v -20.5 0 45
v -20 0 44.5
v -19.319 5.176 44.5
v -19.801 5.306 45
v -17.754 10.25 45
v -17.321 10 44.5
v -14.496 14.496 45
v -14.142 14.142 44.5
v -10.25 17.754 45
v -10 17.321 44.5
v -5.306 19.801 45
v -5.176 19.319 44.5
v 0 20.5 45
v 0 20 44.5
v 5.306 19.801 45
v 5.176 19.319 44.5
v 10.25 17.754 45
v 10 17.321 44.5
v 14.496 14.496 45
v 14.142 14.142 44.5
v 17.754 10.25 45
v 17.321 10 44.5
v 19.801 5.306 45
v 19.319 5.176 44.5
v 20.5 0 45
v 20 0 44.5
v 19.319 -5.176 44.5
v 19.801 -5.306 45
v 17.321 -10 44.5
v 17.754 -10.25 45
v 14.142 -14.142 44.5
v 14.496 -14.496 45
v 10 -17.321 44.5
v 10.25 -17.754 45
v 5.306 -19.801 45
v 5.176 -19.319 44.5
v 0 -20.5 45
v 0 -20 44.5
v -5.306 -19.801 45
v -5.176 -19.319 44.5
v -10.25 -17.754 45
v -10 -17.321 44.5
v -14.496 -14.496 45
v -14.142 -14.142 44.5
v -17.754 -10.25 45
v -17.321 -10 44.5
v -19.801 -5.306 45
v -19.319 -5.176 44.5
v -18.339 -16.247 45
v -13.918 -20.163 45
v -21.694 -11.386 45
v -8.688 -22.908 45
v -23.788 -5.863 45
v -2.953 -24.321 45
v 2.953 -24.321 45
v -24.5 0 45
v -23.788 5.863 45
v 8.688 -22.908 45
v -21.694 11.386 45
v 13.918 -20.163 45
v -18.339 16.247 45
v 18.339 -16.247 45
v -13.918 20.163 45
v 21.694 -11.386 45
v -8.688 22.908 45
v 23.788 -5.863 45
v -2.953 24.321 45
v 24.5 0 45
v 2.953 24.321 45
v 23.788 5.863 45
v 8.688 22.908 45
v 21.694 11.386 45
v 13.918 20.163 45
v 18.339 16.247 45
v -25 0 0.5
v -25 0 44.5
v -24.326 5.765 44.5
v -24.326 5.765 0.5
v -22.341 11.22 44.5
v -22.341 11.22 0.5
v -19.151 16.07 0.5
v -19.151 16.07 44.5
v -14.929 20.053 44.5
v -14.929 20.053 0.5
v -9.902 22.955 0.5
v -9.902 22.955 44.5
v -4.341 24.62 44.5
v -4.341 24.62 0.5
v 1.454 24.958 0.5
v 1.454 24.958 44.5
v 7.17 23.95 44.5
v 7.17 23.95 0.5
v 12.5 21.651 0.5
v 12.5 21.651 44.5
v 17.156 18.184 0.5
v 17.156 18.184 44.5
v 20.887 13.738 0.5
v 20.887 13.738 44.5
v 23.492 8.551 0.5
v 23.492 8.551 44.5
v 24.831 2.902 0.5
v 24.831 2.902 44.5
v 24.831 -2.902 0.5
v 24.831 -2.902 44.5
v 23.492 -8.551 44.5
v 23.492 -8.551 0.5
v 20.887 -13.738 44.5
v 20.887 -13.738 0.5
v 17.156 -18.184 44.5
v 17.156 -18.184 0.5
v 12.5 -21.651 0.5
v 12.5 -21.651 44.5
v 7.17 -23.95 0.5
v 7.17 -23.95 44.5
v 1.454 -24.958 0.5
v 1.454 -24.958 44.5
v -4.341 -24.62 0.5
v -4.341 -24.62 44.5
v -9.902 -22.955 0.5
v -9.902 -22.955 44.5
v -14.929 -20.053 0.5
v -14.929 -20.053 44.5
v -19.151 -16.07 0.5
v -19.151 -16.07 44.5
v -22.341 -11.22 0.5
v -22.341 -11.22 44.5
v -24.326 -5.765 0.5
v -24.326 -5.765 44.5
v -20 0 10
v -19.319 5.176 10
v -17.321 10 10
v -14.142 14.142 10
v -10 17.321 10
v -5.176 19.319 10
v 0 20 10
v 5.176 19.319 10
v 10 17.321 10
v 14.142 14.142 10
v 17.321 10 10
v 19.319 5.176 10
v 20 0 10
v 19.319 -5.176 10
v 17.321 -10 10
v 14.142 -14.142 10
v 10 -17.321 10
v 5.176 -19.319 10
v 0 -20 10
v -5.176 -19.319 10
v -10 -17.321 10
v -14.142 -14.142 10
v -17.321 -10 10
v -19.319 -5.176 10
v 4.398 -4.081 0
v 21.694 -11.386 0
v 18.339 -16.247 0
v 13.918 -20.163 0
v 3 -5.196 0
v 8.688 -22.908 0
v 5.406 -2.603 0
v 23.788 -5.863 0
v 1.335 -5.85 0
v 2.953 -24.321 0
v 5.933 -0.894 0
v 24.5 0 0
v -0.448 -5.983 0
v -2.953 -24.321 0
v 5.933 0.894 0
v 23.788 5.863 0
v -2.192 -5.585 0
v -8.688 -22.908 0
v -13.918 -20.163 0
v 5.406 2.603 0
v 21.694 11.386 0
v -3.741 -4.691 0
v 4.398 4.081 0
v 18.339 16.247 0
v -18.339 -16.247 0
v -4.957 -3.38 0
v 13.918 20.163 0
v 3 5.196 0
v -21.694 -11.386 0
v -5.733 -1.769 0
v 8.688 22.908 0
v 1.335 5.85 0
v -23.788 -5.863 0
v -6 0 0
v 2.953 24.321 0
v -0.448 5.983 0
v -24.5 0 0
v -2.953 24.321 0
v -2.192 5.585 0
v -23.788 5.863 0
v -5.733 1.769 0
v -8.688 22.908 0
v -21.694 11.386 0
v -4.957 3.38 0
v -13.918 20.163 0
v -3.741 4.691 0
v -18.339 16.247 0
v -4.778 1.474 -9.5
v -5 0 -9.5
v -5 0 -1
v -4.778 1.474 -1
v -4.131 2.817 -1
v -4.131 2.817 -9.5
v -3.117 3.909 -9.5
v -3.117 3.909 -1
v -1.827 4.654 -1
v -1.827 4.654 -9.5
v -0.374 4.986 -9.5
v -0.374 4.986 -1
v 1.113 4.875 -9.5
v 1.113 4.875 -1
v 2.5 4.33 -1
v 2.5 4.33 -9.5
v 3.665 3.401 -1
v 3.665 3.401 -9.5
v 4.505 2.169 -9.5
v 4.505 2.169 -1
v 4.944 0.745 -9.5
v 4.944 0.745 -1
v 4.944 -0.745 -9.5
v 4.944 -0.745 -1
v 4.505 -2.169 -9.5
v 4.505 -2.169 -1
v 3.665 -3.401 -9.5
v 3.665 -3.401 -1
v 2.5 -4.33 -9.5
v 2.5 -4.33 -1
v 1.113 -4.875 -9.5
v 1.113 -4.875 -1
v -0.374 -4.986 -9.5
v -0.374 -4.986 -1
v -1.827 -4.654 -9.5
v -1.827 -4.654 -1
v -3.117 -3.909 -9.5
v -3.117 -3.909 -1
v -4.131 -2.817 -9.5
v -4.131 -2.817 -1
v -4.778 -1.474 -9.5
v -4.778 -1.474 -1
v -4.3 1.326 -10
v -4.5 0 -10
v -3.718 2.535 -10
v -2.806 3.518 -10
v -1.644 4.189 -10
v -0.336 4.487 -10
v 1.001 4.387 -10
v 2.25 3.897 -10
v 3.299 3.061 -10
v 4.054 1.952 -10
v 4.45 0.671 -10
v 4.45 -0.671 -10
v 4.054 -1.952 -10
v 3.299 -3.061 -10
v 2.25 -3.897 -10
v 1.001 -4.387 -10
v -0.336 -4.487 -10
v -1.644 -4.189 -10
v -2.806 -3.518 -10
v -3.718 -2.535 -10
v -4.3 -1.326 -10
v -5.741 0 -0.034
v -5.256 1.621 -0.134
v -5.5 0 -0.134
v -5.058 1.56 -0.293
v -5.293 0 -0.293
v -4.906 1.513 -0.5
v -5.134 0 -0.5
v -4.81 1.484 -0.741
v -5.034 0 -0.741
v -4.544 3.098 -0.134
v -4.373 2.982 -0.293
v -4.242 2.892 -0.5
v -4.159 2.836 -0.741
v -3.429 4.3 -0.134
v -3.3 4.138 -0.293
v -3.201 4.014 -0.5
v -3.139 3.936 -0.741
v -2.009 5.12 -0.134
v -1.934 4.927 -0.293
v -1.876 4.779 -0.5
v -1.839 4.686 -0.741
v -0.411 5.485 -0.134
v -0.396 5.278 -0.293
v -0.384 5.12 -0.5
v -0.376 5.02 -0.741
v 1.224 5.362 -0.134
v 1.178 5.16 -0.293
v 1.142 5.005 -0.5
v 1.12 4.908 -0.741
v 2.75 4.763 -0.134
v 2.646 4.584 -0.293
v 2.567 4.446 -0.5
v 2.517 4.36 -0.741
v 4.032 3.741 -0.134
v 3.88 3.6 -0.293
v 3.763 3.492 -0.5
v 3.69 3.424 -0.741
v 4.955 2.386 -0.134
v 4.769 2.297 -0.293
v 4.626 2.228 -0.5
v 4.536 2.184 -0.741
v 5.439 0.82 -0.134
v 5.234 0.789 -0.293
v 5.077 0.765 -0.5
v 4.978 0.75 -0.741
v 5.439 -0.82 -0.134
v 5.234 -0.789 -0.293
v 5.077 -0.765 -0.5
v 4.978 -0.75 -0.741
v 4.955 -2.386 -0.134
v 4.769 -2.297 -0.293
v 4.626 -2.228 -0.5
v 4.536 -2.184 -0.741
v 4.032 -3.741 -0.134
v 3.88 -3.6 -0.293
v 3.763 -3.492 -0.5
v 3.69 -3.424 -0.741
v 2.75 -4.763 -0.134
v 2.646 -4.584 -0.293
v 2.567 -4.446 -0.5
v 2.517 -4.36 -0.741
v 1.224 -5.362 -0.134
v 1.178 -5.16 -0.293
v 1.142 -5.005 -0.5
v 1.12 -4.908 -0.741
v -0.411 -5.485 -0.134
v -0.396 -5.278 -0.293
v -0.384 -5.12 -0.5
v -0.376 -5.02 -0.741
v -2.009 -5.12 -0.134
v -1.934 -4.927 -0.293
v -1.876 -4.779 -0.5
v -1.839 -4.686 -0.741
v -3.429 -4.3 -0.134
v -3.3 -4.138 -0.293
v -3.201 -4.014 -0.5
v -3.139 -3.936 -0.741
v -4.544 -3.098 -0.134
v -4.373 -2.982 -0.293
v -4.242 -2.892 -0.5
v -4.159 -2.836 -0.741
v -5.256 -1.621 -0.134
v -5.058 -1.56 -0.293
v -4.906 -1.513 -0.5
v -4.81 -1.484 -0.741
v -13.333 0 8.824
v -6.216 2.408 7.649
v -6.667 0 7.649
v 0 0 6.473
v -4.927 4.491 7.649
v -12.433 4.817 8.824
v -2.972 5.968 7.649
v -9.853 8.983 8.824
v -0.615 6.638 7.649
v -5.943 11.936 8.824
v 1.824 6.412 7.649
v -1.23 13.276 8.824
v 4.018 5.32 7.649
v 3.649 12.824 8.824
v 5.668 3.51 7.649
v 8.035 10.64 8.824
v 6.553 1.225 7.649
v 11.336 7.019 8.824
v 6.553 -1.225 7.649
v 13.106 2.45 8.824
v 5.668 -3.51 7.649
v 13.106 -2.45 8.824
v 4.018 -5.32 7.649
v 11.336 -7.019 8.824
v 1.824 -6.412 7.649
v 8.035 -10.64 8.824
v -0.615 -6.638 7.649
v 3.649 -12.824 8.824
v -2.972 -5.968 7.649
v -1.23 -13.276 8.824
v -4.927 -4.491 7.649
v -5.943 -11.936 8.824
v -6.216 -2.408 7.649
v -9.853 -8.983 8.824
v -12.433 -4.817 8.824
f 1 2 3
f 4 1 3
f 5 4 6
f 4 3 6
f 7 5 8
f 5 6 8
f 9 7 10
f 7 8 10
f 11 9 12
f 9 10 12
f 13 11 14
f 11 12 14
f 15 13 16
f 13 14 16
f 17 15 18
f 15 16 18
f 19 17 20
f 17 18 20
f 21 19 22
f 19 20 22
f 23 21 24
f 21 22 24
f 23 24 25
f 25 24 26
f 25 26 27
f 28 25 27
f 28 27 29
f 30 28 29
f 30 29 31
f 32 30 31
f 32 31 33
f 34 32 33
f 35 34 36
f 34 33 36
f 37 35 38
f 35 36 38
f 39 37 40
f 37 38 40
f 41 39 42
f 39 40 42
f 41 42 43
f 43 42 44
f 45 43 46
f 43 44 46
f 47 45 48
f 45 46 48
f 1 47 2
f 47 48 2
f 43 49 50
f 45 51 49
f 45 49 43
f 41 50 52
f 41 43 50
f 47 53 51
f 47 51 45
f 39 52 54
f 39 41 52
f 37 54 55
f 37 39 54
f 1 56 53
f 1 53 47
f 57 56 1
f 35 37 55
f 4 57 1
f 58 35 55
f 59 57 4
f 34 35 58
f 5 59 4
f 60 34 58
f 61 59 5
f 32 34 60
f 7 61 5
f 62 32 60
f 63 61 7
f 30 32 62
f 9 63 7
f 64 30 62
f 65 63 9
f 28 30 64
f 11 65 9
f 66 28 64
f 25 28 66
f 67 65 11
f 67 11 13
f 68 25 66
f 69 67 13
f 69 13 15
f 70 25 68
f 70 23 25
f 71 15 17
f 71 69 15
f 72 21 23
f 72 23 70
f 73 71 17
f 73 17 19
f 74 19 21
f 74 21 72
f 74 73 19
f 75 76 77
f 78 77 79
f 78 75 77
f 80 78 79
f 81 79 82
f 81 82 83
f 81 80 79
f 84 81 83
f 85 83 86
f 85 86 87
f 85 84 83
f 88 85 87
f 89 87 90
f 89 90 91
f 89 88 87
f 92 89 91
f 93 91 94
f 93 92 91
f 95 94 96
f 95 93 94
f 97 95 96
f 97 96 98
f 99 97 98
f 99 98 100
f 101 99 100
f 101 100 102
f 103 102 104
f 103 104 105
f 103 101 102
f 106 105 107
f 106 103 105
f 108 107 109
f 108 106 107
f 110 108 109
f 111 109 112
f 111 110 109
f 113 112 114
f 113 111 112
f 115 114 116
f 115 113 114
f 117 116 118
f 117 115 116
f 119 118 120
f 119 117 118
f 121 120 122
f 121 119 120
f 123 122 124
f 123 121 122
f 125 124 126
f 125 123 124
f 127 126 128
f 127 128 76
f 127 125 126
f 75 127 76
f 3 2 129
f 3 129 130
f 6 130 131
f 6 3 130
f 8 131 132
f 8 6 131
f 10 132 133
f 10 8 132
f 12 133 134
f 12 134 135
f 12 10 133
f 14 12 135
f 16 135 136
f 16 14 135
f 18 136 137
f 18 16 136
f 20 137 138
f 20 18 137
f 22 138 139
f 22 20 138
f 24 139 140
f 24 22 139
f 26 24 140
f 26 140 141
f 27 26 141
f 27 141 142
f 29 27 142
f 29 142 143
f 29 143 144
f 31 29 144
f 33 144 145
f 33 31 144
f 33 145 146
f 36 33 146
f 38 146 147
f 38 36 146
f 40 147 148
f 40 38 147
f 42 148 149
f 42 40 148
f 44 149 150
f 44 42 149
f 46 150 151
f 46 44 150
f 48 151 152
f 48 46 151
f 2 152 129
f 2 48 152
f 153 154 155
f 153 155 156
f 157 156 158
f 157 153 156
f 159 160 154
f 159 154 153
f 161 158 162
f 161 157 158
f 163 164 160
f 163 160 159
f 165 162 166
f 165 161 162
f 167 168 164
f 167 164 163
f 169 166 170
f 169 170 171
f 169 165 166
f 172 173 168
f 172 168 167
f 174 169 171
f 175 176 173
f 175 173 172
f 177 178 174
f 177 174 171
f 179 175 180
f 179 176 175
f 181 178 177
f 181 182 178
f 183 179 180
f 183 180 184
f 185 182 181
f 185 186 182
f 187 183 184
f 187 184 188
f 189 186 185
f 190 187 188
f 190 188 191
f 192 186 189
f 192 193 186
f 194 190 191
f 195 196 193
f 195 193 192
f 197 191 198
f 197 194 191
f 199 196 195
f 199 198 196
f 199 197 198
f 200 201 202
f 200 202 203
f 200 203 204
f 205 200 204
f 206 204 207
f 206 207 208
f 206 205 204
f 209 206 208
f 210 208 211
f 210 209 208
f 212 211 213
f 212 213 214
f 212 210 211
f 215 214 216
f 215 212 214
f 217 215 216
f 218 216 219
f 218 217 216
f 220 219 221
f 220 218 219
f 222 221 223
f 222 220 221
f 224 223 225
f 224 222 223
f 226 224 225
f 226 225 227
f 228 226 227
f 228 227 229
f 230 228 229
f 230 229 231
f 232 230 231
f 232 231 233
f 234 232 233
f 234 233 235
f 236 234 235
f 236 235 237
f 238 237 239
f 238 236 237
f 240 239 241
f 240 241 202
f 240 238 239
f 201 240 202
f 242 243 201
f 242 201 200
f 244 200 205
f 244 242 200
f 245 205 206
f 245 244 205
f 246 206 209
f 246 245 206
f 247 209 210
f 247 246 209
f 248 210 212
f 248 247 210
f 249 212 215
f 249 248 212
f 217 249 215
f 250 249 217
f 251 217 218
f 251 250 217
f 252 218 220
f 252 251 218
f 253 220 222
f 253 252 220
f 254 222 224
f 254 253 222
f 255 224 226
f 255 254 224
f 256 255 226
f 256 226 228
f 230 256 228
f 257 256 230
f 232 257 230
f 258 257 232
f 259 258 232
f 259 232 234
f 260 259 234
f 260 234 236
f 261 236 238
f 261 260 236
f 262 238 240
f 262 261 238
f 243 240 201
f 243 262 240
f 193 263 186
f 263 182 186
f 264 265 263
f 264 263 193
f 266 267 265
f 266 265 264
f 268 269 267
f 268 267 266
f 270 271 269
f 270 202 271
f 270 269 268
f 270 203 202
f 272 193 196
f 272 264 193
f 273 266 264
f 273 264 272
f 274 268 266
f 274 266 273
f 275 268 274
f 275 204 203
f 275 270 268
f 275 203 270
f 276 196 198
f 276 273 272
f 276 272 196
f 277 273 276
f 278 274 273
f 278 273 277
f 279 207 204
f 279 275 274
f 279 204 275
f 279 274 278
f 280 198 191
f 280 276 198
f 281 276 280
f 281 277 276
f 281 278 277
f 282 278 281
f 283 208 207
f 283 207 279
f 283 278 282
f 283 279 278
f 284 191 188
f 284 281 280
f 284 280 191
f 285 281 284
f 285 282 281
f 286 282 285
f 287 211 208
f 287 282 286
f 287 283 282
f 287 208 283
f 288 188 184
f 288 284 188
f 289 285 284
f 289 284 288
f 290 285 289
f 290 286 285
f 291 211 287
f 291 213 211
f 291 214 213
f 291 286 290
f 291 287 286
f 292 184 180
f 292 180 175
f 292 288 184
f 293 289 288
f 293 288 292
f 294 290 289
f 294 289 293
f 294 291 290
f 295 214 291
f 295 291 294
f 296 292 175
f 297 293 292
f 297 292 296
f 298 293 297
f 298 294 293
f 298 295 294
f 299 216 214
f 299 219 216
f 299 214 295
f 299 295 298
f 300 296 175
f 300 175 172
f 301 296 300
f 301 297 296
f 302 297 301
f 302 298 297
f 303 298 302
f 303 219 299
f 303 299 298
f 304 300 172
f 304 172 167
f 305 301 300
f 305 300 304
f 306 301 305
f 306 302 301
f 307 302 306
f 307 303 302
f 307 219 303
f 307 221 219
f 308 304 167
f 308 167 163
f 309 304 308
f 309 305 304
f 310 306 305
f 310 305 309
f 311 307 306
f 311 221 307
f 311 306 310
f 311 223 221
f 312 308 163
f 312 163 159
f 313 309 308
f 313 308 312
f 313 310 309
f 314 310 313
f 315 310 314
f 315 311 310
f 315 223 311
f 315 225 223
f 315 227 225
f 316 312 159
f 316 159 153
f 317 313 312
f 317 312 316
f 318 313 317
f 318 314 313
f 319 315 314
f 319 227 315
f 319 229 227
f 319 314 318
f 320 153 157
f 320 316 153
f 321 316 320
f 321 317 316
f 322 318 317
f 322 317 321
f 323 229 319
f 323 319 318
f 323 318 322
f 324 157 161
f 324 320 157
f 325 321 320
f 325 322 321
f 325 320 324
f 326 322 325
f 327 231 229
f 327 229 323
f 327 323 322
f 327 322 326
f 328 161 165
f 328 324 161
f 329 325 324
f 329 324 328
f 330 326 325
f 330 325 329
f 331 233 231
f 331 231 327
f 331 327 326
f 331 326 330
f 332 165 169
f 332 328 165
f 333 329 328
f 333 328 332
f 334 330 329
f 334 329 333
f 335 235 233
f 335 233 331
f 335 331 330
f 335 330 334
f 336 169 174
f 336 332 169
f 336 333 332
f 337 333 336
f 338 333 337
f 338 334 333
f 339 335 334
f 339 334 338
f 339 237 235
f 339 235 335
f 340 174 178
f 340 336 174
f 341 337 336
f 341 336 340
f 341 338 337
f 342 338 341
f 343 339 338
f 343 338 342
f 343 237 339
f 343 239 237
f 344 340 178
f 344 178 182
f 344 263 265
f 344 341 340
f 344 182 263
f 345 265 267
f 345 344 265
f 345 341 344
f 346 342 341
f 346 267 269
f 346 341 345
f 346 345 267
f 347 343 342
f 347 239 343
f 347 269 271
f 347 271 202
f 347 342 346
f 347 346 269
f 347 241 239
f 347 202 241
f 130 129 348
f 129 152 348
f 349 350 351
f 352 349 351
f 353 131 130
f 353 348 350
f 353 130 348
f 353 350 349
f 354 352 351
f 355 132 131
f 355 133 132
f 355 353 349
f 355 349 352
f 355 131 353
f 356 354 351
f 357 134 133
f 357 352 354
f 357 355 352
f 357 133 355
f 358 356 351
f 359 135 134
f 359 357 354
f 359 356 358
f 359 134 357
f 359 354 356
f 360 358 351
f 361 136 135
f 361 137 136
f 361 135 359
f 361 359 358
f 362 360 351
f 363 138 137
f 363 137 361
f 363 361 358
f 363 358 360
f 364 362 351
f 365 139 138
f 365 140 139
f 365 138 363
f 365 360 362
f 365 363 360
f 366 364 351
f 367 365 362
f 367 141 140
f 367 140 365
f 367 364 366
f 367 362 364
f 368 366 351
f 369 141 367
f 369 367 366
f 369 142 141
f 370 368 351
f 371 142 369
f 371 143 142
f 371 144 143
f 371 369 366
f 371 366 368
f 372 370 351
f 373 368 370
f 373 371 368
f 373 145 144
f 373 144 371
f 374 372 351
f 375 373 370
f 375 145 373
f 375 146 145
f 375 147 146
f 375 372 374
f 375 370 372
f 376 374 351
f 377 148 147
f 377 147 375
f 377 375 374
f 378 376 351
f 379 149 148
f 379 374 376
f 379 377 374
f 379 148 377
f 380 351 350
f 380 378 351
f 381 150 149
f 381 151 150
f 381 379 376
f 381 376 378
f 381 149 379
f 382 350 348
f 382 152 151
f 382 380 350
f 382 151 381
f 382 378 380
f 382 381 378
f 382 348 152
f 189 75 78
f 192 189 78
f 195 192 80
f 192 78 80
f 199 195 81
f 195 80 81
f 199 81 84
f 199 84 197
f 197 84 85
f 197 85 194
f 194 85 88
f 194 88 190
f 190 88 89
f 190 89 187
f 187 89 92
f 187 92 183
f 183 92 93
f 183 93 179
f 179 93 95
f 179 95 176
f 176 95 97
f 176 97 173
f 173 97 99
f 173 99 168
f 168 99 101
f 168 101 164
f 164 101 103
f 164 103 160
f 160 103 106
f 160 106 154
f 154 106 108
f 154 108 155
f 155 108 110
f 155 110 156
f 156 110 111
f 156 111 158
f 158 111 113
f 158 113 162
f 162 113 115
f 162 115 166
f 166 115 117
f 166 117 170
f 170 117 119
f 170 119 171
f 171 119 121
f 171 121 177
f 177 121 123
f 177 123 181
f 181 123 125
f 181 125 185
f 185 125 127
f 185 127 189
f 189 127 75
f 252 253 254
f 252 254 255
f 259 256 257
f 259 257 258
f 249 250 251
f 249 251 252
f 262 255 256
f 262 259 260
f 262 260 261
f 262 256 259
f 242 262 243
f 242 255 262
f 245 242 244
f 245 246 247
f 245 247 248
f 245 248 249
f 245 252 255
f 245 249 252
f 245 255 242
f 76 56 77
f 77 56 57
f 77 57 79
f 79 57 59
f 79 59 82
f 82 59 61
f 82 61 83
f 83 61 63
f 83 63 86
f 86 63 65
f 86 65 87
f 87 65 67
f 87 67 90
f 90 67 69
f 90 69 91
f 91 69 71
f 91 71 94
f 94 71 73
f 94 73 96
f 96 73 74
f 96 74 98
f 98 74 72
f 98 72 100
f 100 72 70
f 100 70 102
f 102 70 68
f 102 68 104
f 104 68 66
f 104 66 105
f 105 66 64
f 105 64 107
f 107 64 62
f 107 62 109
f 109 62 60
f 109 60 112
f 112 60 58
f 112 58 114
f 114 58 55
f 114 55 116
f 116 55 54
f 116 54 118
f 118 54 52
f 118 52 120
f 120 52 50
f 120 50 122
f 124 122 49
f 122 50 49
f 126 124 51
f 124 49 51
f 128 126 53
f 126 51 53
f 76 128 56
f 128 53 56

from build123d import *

# Parameters (mm, degrees)
F2_R    = 1
F3_SIZE = 0.5


with BuildPart() as f1:
    # F0 (on Front) → F1 (revolve)
    with BuildSketch(Plane.XZ):
        Polygon((-5, -10), (0, -10), (0, 6.47346), (-20, 10), (-20, 45), (-25, 45), (-25, 0), (-5, 0), align=None)
    revolve(axis=Axis((0, 0, -1.76327), (0, 0, -1)))

    # F2
    f2_edges = [f1.edges().sort_by_distance(p)[0] for p in [
        (5, 0, 0),
    ]]
    fillet(f2_edges, radius=F2_R)

    # F3
    f3_edges = [f1.edges().sort_by_distance(p)[0] for p in [
        (5, 0, -10),
        (25, 0, 0),
        (25, 0, 45),
        (20, 0, 45),
    ]]
    chamfer(f3_edges, length=F3_SIZE)


solid = f1.part
